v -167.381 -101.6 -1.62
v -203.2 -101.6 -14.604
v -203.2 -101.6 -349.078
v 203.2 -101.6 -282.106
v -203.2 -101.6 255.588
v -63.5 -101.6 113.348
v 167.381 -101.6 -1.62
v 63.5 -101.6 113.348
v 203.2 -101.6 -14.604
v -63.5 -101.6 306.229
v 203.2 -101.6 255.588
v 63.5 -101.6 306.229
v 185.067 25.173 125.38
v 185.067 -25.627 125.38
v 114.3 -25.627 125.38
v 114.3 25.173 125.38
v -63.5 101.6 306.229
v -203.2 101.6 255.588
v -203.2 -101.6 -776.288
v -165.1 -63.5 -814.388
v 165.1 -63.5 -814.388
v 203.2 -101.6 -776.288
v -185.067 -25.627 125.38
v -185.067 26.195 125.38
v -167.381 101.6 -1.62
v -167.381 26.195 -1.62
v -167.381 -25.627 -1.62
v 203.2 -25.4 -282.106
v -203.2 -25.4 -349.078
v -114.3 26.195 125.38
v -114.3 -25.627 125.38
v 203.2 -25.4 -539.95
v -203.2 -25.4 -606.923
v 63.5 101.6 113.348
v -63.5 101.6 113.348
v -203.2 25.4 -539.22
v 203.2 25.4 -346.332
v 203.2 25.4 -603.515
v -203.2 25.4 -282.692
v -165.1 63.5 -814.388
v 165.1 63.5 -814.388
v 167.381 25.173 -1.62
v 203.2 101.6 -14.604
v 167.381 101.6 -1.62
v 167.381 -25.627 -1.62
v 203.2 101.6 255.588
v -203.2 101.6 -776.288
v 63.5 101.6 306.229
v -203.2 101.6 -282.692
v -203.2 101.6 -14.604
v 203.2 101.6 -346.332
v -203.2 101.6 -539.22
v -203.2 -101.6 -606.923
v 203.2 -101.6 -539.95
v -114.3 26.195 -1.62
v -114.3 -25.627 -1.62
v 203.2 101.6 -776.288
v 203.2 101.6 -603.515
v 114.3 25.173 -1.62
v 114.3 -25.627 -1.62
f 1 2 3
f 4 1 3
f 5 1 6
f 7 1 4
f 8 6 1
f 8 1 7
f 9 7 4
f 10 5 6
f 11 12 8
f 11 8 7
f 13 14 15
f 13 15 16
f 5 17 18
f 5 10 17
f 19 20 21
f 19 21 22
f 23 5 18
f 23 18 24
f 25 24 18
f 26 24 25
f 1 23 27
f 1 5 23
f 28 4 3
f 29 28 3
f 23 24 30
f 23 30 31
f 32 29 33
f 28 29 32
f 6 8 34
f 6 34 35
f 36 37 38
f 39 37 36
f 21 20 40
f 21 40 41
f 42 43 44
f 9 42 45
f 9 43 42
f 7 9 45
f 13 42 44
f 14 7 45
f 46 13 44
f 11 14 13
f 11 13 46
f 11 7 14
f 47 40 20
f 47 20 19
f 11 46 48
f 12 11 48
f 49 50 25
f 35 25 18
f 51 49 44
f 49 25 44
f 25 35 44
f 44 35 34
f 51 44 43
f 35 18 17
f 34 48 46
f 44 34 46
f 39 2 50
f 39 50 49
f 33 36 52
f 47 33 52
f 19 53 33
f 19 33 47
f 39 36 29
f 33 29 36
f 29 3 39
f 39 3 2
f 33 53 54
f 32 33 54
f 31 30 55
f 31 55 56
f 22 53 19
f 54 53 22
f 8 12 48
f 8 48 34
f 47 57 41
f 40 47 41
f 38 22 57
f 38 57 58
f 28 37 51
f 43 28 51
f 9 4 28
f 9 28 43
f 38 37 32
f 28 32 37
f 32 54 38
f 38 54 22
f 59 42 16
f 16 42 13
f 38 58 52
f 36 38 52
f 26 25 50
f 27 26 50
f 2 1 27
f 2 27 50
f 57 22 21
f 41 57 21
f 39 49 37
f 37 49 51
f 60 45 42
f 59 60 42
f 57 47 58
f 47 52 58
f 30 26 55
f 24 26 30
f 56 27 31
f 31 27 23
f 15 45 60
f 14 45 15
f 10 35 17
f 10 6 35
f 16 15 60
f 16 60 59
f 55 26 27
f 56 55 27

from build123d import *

# Parameters (mm, degrees)
F1_DEPTH  = 101.6
F3_W      = 51.8218297699
F3_H      = 127
F4_DEPTH  = 88.9
F2_W      = 50.8
F2_H      = 127
F5_DEPTH  = 88.9
F7_DEPTH  = 76.2
F9_DEPTH  = 76.2
F11_DEPTH = 203.2
F13_DEPTH = 406.4


with BuildPart() as f1:
    # F0 (on Front) → F1 (new body, symmetric)
    with BuildSketch(Plane.XZ):
        Polygon((-63.5, 255.5875), (-203.2, 255.5875), (-167.3808159173, -1.6199540129), (-203.2, -14.6044082429), (-203.2, -255.5875), (203.2, -255.5875), (203.2, -14.6044082429), (167.3808159173, -1.6199540129), (203.2, 255.5875), (63.5, 255.5875), (63.5, 113.3475), (-63.5, 113.3475), align=None)
        Polygon((-63.5, 306.22875), (-203.2, 255.5875), (-63.5, 255.5875), align=None)
        Polygon((63.5, 306.22875), (63.5, 255.5875), (203.2, 255.5875), align=None)
        Polygon((203.2, -255.5875), (-203.2, -255.5875), (5.2712307392, -288.1220414472), align=None)
        Polygon((5.2712307392, -288.1220414472), (-203.2, -255.5875), (-203.2, -322.3895), align=None)
        Polygon((203.2, -319.0113), (203.2, -255.5875), (5.2712307392, -288.1220414472), align=None)
        Polygon((5.2712307392, -288.1220414472), (-203.2, -322.3895), (-203.2, -512.662041116), (6.3136153163, -545.3592597063), (203.2, -512.9960602239), (203.2, -319.0113), align=None)
        Polygon((6.3136153163, -545.3592597063), (-203.2, -512.662041116), (-203.2, -579.7980602239), align=None)
        Polygon((203.2, -576.085841116), (203.2, -512.9960602239), (6.3136153163, -545.3592597063), align=None)
        Polygon((6.3136153163, -545.3592597063), (-203.2, -579.7980602239), (-203.2, -814.3875), (203.2, -814.3875), (203.2, -576.085841116), align=None)
    extrude(amount=F1_DEPTH, both=True)

    # F3 (on face) → F4 (cut)
    with BuildSketch(Plane(origin=(-203.2, 0, 0), x_dir=(0, -1, 0), z_dir=(-1, 0, 0))):
        with Locations((-0.2844144409, 61.8800459871)):
            Rectangle(F3_W, F3_H)
    extrude(amount=-F4_DEPTH, mode=Mode.SUBTRACT)

    # F2 (on face) → F5 (cut)
    with BuildSketch(Plane.YZ.offset(203.2)):
        with Locations((-0.2265004441, 61.8800459871)):
            Rectangle(F2_W, F2_H)
    extrude(amount=-F5_DEPTH, mode=Mode.SUBTRACT)

    # F6 (on face) → F7 (cut)
    with BuildSketch(Plane.XZ.offset(101.6)):
        Polygon((203.2, -282.1055948734), (-203.2, -349.0782082081), (-203.2, -606.9228053093), (203.2, -539.9501919746), align=None)
    extrude(amount=-F7_DEPTH, mode=Mode.SUBTRACT)

    # F8 (on face) → F9 (cut)
    with BuildSketch(Plane(origin=(0, 101.6, 0), x_dir=(-1, 0, 0), z_dir=(0, 1, 0))):
        Polygon((-203.2, -346.3322222233), (-203.2, -603.5153269768), (203.2, -539.219558239), (203.2, -282.6924920082), align=None)
    extrude(amount=-F9_DEPTH, mode=Mode.SUBTRACT)

    # F10 (on face) → F11 (cut)
    with BuildSketch(Plane.XZ.offset(101.6)):
        Polygon((203.2, -776.2875), (165.1, -814.3875), (203.2, -814.3875), align=None)
        Polygon((-203.2, -814.3875), (-165.1, -814.3875), (-203.2, -776.2875), align=None)
    extrude(amount=-F11_DEPTH, mode=Mode.SUBTRACT)

    # F12 (on face) → F13 (cut)
    with BuildSketch(Plane.YZ.offset(203.2)):
        Polygon((-63.5, -814.3875), (-101.6, -776.2875), (-101.6029715538, -814.3875), align=None)
        Polygon((101.6, -814.3875), (101.6, -776.2875), (63.5, -814.3875), align=None)
    extrude(amount=-F13_DEPTH, mode=Mode.SUBTRACT)


solid = f1.part
